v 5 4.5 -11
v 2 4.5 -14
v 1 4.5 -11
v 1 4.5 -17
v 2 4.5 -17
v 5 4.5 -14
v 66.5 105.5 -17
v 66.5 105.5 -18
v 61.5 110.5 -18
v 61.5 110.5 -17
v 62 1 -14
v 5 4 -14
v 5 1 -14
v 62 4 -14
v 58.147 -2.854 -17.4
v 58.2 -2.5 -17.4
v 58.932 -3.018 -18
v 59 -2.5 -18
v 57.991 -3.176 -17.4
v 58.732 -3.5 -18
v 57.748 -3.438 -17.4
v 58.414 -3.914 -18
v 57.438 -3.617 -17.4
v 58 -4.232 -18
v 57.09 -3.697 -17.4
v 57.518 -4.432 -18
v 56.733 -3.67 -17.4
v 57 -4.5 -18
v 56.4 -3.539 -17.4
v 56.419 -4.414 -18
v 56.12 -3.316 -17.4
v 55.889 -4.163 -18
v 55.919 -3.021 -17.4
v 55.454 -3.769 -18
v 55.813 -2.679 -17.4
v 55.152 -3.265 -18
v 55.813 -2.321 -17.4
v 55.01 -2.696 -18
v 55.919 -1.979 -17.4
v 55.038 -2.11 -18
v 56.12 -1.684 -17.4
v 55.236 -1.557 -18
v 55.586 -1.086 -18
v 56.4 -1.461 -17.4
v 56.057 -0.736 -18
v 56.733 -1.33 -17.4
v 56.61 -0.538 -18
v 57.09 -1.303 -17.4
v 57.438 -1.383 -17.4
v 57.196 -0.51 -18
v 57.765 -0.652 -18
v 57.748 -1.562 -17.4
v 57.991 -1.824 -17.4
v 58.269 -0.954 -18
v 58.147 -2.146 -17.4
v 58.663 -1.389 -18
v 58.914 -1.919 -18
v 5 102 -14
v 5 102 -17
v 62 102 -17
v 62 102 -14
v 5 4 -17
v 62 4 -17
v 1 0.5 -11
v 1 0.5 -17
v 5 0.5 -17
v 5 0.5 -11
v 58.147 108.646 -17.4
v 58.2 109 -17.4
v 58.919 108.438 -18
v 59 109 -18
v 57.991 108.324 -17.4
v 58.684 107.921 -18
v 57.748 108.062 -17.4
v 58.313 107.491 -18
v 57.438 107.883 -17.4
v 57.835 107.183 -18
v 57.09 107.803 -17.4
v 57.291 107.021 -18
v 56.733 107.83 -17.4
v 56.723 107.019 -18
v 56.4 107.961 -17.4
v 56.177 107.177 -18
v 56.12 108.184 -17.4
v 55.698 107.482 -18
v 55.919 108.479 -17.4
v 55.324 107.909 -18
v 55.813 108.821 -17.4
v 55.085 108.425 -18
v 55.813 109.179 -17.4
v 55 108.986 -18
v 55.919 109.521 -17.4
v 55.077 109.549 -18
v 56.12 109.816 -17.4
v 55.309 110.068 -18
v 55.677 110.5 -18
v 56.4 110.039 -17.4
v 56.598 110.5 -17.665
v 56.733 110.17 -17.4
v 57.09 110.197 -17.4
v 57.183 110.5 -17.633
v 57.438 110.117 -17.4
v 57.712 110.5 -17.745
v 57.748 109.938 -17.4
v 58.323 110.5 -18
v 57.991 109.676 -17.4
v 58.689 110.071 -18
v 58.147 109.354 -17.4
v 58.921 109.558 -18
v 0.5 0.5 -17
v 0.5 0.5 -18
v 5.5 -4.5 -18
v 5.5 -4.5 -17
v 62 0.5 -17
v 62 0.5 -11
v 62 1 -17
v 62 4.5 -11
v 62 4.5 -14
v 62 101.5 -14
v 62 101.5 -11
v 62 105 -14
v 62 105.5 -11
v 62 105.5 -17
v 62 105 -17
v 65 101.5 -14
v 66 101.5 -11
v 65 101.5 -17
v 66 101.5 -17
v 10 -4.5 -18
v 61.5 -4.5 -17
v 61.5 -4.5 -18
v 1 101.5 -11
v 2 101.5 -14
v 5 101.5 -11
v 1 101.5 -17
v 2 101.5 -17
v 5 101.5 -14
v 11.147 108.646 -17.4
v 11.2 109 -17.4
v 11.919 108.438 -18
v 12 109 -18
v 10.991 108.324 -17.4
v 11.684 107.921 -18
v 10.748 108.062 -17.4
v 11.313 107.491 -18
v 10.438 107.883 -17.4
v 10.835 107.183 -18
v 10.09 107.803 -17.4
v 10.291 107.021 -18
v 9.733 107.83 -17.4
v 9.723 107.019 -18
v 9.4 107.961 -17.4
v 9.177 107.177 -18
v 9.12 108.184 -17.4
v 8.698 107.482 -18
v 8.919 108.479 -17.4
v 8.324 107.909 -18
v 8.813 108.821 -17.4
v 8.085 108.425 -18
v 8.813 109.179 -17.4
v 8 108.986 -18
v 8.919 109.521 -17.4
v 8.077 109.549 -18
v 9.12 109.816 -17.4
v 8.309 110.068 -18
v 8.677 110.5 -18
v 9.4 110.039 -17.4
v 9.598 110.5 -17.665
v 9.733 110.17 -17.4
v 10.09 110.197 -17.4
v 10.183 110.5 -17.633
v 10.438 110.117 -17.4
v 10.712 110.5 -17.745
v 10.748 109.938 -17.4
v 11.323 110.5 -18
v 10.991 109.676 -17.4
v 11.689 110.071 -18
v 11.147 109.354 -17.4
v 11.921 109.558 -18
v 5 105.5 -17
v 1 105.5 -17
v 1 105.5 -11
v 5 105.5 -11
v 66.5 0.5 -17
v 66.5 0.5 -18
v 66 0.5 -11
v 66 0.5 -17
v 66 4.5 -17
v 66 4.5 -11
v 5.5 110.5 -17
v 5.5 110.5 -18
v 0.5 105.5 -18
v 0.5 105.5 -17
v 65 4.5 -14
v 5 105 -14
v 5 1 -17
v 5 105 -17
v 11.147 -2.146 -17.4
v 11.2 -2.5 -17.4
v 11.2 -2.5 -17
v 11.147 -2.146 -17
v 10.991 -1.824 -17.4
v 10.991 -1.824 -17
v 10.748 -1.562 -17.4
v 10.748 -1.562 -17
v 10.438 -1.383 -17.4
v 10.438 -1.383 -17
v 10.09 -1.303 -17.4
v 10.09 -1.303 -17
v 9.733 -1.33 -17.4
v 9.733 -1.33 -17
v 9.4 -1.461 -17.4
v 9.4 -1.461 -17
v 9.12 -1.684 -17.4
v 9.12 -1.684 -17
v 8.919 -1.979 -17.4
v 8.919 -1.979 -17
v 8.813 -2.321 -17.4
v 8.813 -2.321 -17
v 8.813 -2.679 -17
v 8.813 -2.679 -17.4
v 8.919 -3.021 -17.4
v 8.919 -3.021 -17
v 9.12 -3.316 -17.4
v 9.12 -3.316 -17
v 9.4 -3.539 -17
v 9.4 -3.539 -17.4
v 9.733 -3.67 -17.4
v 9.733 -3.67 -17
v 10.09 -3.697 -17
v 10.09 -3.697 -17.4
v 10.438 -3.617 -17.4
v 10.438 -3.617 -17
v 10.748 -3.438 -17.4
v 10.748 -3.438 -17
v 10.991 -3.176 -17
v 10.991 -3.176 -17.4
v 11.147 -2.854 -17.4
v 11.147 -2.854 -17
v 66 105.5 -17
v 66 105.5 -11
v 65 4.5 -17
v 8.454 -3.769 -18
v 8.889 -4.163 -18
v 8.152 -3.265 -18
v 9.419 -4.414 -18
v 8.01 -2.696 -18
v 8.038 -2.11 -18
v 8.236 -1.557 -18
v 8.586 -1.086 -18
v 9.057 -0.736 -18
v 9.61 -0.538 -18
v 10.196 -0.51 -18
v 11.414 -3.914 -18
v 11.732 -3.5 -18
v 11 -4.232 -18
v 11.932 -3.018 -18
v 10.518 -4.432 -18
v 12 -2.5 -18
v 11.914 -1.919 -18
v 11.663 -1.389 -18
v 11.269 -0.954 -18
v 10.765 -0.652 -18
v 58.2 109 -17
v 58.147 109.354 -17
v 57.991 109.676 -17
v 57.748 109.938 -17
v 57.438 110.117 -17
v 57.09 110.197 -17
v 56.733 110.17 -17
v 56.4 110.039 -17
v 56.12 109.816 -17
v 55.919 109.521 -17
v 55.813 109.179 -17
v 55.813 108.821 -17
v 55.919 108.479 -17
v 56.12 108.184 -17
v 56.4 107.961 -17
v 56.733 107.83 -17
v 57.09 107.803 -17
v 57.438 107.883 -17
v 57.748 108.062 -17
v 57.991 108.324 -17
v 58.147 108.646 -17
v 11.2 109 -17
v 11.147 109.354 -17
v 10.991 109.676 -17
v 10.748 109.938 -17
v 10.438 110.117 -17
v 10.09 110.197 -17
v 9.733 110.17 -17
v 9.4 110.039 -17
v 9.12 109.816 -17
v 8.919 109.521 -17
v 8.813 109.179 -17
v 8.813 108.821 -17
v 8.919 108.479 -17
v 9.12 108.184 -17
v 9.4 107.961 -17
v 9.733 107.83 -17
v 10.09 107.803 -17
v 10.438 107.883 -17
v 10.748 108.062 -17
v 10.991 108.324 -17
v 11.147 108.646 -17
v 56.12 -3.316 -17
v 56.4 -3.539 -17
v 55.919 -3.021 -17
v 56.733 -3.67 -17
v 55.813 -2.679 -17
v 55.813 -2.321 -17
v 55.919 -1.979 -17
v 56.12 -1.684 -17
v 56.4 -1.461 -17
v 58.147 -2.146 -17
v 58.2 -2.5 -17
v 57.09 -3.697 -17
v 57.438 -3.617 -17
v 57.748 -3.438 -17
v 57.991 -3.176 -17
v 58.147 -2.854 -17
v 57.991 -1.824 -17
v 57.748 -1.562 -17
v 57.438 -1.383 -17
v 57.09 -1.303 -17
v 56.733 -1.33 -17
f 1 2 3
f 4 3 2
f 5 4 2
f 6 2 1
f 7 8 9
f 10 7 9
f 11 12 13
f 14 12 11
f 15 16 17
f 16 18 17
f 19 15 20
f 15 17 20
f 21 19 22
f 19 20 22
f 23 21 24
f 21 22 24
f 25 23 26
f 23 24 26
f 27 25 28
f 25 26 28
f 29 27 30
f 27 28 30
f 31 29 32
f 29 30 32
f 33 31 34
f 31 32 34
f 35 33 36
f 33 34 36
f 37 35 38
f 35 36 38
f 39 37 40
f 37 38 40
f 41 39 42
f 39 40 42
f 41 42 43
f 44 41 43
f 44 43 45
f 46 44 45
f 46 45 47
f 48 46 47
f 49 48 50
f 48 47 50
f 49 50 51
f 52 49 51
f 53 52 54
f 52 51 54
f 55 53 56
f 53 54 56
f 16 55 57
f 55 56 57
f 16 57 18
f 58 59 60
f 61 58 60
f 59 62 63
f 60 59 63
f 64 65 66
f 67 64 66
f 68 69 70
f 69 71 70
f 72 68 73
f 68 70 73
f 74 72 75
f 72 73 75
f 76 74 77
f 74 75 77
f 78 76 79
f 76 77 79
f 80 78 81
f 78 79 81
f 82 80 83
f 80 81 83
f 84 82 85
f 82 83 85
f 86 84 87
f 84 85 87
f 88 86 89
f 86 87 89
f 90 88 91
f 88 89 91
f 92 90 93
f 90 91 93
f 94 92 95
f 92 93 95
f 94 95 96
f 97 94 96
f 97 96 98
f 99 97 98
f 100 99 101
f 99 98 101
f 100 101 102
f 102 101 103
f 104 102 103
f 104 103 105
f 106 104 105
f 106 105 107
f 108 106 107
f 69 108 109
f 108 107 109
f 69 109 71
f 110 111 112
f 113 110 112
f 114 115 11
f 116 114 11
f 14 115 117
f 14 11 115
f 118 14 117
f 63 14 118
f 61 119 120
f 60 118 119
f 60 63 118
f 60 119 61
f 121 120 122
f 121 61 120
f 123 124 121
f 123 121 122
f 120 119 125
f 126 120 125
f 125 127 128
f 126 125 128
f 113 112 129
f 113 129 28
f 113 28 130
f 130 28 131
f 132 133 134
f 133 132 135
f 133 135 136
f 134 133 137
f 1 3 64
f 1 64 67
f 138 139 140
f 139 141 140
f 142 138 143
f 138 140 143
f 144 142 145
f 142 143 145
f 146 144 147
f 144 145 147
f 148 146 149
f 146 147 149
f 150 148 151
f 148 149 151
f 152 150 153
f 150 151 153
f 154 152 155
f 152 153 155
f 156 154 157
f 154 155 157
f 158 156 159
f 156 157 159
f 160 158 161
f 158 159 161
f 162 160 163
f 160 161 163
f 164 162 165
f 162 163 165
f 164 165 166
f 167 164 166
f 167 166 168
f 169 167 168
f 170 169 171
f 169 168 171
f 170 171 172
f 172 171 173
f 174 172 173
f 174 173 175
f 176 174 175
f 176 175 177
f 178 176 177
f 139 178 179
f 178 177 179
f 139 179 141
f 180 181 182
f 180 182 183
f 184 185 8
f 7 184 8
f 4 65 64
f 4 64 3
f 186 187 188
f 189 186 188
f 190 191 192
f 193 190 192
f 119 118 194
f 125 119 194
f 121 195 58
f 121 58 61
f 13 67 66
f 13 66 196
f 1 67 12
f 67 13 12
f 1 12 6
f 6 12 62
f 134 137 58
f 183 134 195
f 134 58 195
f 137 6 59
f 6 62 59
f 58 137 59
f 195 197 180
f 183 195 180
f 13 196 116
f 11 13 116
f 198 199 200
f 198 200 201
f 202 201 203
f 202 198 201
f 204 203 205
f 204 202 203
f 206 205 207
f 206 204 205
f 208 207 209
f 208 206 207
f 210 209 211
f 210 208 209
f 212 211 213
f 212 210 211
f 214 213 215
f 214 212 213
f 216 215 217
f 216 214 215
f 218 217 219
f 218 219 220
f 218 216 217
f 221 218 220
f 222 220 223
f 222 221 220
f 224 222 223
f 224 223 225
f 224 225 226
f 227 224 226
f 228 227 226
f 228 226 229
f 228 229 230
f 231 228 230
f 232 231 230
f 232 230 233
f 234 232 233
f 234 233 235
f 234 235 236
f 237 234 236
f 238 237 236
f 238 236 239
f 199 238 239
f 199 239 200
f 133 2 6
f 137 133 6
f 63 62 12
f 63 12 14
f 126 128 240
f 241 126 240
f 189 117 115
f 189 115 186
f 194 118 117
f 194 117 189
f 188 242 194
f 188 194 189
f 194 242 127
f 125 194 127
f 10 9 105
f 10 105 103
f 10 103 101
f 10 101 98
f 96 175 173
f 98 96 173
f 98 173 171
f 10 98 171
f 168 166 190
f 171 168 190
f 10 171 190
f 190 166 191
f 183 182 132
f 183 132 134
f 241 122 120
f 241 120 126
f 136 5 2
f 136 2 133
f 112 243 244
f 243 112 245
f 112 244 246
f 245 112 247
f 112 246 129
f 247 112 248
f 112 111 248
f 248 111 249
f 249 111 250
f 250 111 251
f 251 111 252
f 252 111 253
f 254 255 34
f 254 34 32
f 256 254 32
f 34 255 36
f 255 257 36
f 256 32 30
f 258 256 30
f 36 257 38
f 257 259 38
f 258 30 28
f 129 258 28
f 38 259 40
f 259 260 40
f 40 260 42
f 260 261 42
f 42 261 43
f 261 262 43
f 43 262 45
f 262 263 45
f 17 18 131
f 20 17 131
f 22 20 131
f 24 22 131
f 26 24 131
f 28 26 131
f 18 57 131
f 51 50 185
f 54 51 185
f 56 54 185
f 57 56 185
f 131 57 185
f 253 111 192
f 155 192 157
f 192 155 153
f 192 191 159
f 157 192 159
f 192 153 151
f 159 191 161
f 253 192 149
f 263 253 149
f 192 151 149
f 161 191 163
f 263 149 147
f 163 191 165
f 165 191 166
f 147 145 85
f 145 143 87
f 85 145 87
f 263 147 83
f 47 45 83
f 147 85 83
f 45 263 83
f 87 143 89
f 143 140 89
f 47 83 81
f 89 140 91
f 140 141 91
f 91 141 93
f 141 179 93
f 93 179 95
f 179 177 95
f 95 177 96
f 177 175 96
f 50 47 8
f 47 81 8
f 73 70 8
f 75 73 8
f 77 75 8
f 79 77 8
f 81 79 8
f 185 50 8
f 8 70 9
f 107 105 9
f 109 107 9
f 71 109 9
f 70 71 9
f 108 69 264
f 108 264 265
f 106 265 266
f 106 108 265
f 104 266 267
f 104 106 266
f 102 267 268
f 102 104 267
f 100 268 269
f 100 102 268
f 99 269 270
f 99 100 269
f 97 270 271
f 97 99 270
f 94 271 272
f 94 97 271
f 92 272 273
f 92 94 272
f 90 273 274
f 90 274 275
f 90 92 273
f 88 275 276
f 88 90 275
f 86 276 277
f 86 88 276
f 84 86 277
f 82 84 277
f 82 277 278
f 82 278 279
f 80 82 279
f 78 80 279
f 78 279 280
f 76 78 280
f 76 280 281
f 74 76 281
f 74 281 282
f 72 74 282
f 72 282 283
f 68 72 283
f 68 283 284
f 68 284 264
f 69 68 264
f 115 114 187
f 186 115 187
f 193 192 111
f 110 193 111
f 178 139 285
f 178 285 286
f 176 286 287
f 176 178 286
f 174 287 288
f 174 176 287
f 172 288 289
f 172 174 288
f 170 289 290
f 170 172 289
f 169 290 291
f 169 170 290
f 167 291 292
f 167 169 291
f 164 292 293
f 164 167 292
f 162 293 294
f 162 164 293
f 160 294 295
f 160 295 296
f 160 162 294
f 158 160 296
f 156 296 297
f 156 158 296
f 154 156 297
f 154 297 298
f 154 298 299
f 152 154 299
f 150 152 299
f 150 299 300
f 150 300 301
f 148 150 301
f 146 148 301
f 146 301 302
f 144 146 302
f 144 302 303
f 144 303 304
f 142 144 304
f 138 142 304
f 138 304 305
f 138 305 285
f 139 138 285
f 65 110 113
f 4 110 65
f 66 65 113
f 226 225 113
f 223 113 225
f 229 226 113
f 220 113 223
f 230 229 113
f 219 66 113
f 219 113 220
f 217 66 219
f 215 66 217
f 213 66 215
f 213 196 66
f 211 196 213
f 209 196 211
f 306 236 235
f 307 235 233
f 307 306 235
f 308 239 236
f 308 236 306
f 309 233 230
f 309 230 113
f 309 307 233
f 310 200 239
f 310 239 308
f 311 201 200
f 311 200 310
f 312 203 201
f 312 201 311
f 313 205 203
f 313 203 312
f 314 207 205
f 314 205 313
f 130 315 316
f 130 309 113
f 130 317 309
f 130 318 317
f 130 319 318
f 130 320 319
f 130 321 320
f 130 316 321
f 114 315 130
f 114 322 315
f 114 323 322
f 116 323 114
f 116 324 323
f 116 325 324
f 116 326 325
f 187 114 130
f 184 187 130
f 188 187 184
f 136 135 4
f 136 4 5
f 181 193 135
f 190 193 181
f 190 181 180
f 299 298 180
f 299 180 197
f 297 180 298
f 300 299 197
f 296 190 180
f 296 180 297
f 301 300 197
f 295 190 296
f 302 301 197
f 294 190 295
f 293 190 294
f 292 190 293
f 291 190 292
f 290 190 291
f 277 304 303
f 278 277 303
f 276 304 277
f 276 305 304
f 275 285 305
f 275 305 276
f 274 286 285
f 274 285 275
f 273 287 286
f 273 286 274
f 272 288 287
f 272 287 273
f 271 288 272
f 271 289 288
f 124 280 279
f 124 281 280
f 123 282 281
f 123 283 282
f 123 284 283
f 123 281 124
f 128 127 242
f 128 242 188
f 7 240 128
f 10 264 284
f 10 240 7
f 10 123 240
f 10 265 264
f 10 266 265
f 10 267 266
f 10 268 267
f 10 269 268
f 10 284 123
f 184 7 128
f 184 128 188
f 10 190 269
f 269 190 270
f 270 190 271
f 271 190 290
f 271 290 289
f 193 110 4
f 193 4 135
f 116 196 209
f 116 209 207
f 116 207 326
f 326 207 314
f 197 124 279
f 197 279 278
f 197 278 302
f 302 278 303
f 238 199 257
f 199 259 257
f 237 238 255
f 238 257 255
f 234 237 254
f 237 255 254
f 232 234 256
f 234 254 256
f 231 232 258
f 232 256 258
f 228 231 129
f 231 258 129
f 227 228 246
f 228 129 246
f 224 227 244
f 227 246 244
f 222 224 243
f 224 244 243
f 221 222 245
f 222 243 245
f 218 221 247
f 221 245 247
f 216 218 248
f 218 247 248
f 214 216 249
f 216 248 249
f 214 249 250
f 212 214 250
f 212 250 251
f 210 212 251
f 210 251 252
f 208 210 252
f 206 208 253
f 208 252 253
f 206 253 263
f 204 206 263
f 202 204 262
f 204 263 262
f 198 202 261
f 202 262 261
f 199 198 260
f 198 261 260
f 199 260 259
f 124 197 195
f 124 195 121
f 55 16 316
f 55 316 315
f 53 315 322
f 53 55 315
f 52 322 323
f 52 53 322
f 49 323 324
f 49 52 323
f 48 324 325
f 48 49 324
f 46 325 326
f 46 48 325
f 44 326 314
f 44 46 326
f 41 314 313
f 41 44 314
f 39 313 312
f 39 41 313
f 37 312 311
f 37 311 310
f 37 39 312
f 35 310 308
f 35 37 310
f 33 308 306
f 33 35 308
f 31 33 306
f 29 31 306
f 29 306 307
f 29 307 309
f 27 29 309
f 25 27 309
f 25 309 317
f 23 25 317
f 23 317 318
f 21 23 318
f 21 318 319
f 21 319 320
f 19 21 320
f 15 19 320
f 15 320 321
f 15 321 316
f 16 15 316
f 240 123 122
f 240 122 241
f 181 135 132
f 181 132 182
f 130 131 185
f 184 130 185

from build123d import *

# Parameters (mm, degrees)
BOX022_W          = 63
BOX022_H          = 3
BOX022_DEPTH      = 3
BOX023_W          = 3
BOX023_H          = 104
BOX023_DEPTH      = 3
BOX024_W          = 3
BOX024_H          = 104
BOX024_DEPTH      = 3
BOX018_W          = 4
BOX018_H          = 4
BOX018_DEPTH      = 6
BOX017_W          = 4
BOX017_H          = 4
BOX017_DEPTH      = 6
BOX020_W          = 4
BOX020_H          = 4
BOX020_DEPTH      = 6
BOX019_W          = 4
BOX019_H          = 4
BOX019_DEPTH      = 6
BOX021_W          = 63
BOX021_H          = 3
BOX021_DEPTH      = 3
CYLINDER001_R     = 1.2
CYLINDER001_DEPTH = 1
CYLINDER002_R     = 1.2
CYLINDER002_DEPTH = 1
CYLINDER003_R     = 1.2
CYLINDER003_DEPTH = 1
CYLINDER_R        = 1.2
CYLINDER_DEPTH    = 1
PAD003_DEPTH      = 1


with BuildPart() as cone002:
    # Cone002 → Cone002 (revolve)
    with BuildSketch(Plane(origin=(10, 109, -16.5), x_dir=(1, 0, 0), z_dir=(0, 1, 0))):
        Polygon((0, 0), (2, 1.5), (0, 1.5), align=None)
    revolve(axis=Axis((10, 109, -16.5), (0, 0, -1)))


with BuildPart() as cone001:
    # Cone001 → Cone001 (revolve)
    with BuildSketch(Plane(origin=(10, -2.5, -16.5), x_dir=(1, 0, 0), z_dir=(0, 1, 0))):
        Polygon((0, 0), (2, 1.5), (0, 1.5), align=None)
    revolve(axis=Axis((10, -2.5, -16.5), (0, 0, -1)))


with BuildPart() as cone003:
    # Cone003 → Cone003 (revolve)
    with BuildSketch(Plane(origin=(57, 109, -16.5), x_dir=(1, 0, 0), z_dir=(0, 1, 0))):
        Polygon((0, 0), (2, 1.5), (0, 1.5), align=None)
    revolve(axis=Axis((57, 109, -16.5), (0, 0, -1)))


with BuildPart() as fusion010:
    # Cone → Cone (revolve)
    with BuildSketch(Plane(origin=(57, -2.5, -16.5), x_dir=(1, 0, 0), z_dir=(0, 1, 0))):
        Polygon((0, 0), (2, 1.5), (0, 1.5), align=None)
    revolve(axis=Axis((57, -2.5, -16.5), (0, 0, -1)))

    # Fusion010: union Cone002, Cone001, Cone003
    add(cone002.part)
    add(cone001.part)
    add(cone003.part)


with BuildPart() as cube022:
    # Box022 → Box022 (new body)
    with BuildSketch(Plane(origin=(2, 102, -17), x_dir=(1, 0, 0), z_dir=(0, 0, 1))):
        with Locations((31.5, 1.5)):
            Rectangle(BOX022_W, BOX022_H)
    extrude(amount=BOX022_DEPTH)


with BuildPart() as cube023:
    # Box023 → Box023 (new body)
    with BuildSketch(Plane(origin=(2, 1, -17), x_dir=(1, 0, 0), z_dir=(0, 0, 1))):
        with Locations((1.5, 52)):
            Rectangle(BOX023_W, BOX023_H)
    extrude(amount=BOX023_DEPTH)


with BuildPart() as cube024:
    # Box024 → Box024 (new body)
    with BuildSketch(Plane(origin=(62, 1, -17), x_dir=(1, 0, 0), z_dir=(0, 0, 1))):
        with Locations((1.5, 52)):
            Rectangle(BOX024_W, BOX024_H)
    extrude(amount=BOX024_DEPTH)


with BuildPart() as cube018:
    # Box018 → Box018 (new body)
    with BuildSketch(Plane(origin=(1, 101.5, -17), x_dir=(1, 0, 0), z_dir=(0, 0, 1))):
        with Locations((2, 2)):
            Rectangle(BOX018_W, BOX018_H)
    extrude(amount=BOX018_DEPTH)


with BuildPart() as cube017:
    # Box017 → Box017 (new body)
    with BuildSketch(Plane(origin=(1, 0.5, -17), x_dir=(1, 0, 0), z_dir=(0, 0, 1))):
        with Locations((2, 2)):
            Rectangle(BOX017_W, BOX017_H)
    extrude(amount=BOX017_DEPTH)


with BuildPart() as cube020:
    # Box020 → Box020 (new body)
    with BuildSketch(Plane(origin=(62, 0.5, -17), x_dir=(1, 0, 0), z_dir=(0, 0, 1))):
        with Locations((2, 2)):
            Rectangle(BOX020_W, BOX020_H)
    extrude(amount=BOX020_DEPTH)


with BuildPart() as cube019:
    # Box019 → Box019 (new body)
    with BuildSketch(Plane(origin=(62, 101.5, -17), x_dir=(1, 0, 0), z_dir=(0, 0, 1))):
        with Locations((2, 2)):
            Rectangle(BOX019_W, BOX019_H)
    extrude(amount=BOX019_DEPTH)


with BuildPart() as fusion011:
    # Box021 → Box021 (new body)
    with BuildSketch(Plane(origin=(2, 1, -17), x_dir=(1, 0, 0), z_dir=(0, 0, 1))):
        with Locations((31.5, 1.5)):
            Rectangle(BOX021_W, BOX021_H)
    extrude(amount=BOX021_DEPTH)

    # Fusion011: union Cube022, Cube023, Cube024, Cube018, Cube017, Cube020, Cube019
    add(cube022.part)
    add(cube023.part)
    add(cube024.part)
    add(cube018.part)
    add(cube017.part)
    add(cube020.part)
    add(cube019.part)


with BuildPart() as cylinder001:
    # Cylinder001 → Cylinder001 (new body)
    with BuildSketch(Plane(origin=(57, -2.5, -18), x_dir=(1, 0, 0), z_dir=(0, 0, 1))):
        Circle(CYLINDER001_R)
    extrude(amount=CYLINDER001_DEPTH)


with BuildPart() as cylinder002:
    # Cylinder002 → Cylinder002 (new body)
    with BuildSketch(Plane(origin=(57, 109, -18), x_dir=(1, 0, 0), z_dir=(0, 0, 1))):
        Circle(CYLINDER002_R)
    extrude(amount=CYLINDER002_DEPTH)


with BuildPart() as cylinder003:
    # Cylinder003 → Cylinder003 (new body)
    with BuildSketch(Plane(origin=(10, 109, -18), x_dir=(1, 0, 0), z_dir=(0, 0, 1))):
        Circle(CYLINDER003_R)
    extrude(amount=CYLINDER003_DEPTH)


with BuildPart() as fusion006:
    # Cylinder → Cylinder (new body)
    with BuildSketch(Plane(origin=(10, -2.5, -18), x_dir=(1, 0, 0), z_dir=(0, 0, 1))):
        Circle(CYLINDER_R)
    extrude(amount=CYLINDER_DEPTH)

    # Fusion006: union Cylinder001, Cylinder002, Cylinder003
    add(cylinder001.part)
    add(cylinder002.part)
    add(cylinder003.part)


with BuildPart() as cut004:
    # Sketch003 → Pad003 (new body)
    with BuildSketch(Plane.XY.offset(-18)):
        Polygon((0.5, 0.5), (5.5, -4.5), (61.5, -4.5), (66.5, 0.5), (66.5, 105.5), (61.5, 110.5), (5.5, 110.5), (0.5, 105.5), align=None)
    extrude(amount=PAD003_DEPTH)

    # Cut002: cut Fusion006
    add(fusion006.part, mode=Mode.SUBTRACT)

    # Fusion012: union Fusion011
    add(fusion011.part)

    # Cut004: cut Fusion010
    add(fusion010.part, mode=Mode.SUBTRACT)


solid = cut004.part
